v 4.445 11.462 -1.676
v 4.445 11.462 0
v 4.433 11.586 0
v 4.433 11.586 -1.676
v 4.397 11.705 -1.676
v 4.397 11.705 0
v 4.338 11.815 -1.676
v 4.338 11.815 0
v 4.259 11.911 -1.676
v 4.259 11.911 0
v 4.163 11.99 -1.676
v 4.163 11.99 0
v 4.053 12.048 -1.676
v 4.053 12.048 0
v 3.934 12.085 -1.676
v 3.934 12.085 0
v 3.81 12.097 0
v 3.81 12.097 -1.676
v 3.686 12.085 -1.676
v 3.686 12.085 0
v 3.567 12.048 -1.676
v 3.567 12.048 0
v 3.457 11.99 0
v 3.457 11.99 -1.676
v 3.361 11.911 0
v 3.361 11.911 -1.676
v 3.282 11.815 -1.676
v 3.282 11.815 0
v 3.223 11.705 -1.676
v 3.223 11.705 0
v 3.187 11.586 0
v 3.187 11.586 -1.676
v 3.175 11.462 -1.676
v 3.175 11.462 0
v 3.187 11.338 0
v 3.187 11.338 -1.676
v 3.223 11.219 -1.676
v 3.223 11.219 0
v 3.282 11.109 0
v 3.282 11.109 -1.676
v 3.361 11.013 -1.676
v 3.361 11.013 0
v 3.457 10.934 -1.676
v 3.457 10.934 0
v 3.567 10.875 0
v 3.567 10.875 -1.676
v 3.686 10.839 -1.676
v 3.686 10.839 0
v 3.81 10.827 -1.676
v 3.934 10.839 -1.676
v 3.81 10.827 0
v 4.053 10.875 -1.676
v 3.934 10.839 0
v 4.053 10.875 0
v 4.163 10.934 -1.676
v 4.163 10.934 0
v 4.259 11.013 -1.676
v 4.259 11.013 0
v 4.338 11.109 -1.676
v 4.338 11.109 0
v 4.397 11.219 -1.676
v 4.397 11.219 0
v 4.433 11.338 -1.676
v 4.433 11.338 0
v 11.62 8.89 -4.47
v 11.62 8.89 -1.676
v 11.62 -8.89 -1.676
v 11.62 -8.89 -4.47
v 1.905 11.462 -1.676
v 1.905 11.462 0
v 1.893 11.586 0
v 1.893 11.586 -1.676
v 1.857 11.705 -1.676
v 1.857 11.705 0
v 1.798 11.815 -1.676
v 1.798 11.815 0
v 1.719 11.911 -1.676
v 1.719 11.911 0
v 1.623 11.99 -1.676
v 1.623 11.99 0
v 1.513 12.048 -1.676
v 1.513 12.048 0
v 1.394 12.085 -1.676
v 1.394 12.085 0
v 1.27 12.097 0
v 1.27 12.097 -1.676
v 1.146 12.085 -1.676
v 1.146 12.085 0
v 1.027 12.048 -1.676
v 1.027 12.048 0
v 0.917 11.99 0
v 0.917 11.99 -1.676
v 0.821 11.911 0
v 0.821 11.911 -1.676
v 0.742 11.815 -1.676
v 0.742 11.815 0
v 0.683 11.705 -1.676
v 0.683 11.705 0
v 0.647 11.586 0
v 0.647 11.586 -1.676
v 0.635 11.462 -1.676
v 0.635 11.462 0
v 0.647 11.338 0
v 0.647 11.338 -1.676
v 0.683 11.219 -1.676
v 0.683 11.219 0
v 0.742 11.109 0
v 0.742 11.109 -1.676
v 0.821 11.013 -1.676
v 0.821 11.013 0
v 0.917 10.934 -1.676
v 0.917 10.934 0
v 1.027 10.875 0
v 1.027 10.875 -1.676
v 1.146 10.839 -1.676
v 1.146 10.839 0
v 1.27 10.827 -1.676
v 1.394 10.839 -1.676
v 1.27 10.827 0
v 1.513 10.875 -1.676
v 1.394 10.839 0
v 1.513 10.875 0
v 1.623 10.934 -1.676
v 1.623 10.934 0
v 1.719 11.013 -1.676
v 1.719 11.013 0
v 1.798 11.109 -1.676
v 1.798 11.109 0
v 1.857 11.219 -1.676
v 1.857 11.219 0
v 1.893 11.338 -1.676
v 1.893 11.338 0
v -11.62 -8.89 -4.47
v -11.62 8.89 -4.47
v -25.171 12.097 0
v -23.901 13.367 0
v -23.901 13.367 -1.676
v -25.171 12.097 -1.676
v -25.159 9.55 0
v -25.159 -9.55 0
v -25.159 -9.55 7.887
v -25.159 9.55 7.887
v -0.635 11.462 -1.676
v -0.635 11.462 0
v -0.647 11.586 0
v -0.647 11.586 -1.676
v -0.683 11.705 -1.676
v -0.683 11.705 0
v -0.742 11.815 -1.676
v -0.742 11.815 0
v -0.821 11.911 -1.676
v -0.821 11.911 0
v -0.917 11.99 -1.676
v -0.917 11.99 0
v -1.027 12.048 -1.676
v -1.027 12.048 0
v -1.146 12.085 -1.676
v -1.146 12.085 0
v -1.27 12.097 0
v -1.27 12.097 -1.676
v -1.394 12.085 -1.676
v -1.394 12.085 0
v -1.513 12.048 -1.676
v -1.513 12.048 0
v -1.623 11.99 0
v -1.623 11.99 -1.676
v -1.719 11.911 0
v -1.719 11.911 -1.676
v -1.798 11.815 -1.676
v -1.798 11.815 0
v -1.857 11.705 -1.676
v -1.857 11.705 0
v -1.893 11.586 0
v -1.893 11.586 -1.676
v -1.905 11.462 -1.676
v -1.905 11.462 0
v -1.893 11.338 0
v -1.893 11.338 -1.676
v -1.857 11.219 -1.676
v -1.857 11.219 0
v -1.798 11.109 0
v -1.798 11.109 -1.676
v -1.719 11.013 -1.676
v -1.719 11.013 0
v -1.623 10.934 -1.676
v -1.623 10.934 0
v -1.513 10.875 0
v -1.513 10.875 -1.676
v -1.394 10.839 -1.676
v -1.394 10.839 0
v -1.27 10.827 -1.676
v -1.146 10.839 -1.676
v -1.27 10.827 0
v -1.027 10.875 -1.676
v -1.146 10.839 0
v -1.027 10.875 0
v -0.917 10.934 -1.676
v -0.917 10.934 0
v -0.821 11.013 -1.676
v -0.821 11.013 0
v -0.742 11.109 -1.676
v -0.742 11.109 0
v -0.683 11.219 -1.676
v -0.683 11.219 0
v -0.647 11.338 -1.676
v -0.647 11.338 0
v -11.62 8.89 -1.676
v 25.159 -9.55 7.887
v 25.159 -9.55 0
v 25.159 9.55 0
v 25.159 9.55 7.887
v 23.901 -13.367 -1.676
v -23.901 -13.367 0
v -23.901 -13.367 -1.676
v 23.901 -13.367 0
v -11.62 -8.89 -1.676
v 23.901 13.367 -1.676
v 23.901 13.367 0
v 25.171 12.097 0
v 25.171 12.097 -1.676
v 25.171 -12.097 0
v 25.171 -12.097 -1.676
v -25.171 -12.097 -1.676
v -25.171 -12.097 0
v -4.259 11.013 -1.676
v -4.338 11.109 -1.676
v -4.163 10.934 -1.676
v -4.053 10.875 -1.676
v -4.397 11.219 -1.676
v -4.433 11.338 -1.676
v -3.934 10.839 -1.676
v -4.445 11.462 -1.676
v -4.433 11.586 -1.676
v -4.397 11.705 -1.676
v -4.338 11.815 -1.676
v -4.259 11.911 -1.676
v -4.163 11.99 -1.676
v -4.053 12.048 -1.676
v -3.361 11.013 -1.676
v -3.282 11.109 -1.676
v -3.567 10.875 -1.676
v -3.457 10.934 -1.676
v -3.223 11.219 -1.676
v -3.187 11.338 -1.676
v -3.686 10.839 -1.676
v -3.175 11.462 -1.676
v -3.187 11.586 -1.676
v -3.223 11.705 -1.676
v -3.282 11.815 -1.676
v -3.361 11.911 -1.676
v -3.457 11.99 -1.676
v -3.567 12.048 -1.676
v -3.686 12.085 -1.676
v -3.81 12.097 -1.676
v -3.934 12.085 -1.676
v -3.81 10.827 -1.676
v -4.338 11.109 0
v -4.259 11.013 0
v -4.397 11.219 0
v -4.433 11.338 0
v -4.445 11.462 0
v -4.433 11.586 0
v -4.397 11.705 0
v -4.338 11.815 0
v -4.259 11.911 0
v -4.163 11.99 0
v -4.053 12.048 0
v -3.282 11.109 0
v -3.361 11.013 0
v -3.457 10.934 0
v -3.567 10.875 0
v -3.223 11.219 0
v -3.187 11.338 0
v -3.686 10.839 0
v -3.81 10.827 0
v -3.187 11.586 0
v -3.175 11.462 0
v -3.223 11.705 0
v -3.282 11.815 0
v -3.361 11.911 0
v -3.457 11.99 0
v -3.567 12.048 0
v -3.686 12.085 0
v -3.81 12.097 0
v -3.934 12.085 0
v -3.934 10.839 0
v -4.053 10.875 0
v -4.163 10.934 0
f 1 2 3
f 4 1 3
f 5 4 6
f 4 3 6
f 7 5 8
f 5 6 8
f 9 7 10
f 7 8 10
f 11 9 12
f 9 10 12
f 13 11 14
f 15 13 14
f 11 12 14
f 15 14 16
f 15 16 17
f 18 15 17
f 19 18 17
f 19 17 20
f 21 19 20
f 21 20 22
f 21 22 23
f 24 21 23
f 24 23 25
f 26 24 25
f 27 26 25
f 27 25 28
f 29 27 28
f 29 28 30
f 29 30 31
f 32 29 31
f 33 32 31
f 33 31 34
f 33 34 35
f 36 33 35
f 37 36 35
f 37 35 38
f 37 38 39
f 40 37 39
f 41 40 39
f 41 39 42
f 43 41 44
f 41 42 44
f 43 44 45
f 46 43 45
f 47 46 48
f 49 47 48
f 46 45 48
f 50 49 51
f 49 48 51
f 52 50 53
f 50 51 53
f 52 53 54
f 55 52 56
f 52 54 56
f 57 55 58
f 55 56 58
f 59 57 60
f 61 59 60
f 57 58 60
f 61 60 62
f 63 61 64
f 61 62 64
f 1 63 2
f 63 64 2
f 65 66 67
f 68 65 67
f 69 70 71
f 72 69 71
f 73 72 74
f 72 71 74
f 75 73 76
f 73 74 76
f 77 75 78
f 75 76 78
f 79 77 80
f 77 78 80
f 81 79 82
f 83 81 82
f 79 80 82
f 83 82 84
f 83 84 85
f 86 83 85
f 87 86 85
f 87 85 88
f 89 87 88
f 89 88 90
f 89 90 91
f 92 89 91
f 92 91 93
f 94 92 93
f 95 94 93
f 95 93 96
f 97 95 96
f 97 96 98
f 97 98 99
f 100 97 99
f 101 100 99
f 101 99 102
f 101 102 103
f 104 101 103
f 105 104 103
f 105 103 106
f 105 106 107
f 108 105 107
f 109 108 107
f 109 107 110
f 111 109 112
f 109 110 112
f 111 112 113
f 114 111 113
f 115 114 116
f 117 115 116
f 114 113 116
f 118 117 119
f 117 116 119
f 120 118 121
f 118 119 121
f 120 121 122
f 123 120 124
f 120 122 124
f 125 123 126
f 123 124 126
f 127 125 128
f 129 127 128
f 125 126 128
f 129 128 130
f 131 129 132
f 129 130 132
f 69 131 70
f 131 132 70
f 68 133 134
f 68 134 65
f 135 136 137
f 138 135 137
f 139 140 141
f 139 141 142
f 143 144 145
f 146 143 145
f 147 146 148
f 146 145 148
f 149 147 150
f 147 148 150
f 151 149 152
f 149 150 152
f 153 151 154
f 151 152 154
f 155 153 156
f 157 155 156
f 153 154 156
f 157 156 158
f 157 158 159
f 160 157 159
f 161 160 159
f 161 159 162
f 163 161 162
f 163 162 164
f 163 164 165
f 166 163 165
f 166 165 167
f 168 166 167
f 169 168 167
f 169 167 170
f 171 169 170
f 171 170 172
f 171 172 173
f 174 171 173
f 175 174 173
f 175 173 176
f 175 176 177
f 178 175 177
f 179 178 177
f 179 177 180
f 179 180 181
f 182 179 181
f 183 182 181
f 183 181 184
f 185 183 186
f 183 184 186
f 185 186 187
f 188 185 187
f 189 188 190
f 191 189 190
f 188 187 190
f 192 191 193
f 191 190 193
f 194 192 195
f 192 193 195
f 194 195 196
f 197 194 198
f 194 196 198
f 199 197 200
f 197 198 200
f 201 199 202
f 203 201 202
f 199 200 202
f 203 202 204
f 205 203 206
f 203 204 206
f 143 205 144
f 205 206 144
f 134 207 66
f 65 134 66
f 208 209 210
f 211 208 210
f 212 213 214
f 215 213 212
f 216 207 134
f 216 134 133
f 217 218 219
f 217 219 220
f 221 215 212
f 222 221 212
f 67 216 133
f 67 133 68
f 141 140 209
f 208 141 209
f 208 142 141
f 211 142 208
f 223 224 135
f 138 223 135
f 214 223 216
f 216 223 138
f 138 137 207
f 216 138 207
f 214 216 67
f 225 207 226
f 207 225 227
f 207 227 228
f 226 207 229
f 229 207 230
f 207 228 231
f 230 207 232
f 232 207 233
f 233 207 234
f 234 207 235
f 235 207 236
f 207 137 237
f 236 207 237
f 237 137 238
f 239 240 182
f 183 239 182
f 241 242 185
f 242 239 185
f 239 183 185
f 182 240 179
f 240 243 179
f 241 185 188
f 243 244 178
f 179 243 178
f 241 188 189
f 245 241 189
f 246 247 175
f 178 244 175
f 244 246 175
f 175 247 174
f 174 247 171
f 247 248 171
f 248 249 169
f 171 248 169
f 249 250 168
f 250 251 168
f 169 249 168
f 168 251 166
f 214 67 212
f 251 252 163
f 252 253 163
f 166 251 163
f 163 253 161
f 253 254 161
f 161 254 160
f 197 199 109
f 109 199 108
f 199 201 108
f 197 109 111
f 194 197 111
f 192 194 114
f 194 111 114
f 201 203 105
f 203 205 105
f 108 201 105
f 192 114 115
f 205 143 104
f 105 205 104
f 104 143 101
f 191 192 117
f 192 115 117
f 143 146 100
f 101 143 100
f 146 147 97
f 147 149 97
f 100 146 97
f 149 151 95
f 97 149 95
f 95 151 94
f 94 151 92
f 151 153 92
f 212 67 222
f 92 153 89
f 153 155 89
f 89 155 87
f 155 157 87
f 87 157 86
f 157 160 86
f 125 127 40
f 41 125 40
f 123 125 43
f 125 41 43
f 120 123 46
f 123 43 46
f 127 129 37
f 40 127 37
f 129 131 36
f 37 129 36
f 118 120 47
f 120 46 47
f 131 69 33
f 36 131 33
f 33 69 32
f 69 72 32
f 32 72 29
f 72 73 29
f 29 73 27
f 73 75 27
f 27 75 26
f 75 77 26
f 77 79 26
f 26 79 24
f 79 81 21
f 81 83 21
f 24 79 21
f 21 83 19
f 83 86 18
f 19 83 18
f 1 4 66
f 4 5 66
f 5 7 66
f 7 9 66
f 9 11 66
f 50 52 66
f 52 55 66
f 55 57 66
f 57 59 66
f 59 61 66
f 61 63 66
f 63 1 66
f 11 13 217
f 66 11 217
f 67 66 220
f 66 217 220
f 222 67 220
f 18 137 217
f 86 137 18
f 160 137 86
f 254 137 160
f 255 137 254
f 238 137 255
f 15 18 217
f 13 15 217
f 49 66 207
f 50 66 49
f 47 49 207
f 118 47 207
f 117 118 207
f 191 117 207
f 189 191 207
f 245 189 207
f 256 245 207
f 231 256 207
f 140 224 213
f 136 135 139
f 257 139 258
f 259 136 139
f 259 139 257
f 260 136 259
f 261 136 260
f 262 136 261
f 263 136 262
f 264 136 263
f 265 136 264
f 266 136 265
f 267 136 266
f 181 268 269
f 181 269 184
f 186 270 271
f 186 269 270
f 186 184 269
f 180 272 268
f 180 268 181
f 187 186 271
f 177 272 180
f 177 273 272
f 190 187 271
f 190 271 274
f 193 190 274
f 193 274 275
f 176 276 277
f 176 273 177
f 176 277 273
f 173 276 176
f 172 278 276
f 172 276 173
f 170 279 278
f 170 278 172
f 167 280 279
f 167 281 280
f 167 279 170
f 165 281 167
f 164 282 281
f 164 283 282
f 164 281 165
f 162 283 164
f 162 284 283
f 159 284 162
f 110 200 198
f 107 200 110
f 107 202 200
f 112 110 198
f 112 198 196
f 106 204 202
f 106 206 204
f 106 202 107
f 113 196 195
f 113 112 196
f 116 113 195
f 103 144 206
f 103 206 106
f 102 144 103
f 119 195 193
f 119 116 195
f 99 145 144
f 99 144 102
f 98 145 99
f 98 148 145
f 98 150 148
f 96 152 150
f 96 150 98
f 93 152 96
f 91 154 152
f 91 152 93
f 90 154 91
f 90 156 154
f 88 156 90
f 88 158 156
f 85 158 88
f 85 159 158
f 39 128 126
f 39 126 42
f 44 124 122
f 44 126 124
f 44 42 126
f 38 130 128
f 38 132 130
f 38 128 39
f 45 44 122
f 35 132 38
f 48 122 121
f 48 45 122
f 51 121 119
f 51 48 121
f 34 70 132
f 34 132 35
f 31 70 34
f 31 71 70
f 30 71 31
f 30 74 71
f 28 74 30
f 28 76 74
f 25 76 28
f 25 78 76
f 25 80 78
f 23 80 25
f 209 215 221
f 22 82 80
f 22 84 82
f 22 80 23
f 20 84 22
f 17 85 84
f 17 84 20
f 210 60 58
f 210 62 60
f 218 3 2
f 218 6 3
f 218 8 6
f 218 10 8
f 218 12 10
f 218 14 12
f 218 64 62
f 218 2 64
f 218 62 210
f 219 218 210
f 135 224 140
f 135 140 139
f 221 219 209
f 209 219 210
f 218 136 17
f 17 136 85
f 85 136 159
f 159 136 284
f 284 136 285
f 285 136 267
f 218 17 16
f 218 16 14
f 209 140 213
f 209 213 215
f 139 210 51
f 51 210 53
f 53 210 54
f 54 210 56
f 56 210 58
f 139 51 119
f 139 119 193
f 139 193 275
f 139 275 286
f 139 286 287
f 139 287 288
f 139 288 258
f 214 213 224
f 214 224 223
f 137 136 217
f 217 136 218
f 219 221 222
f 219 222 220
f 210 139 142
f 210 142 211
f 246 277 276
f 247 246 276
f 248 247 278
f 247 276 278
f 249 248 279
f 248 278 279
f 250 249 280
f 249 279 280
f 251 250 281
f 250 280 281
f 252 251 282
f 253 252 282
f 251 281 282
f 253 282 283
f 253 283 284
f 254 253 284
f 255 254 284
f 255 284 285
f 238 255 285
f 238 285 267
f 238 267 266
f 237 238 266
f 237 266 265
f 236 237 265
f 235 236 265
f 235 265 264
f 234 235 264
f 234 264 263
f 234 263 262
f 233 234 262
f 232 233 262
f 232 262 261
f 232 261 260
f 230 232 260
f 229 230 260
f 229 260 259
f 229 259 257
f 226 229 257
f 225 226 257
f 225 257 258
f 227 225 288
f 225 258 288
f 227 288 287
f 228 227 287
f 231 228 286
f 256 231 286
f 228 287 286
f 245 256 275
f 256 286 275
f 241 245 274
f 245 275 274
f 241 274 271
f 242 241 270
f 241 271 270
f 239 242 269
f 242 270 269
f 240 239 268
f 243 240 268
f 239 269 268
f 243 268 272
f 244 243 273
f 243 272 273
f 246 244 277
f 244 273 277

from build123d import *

# Parameters (mm, degrees)
F0_W     = 50.3428
F0_H     = 26.7335
F1_DEPTH = 1.6764
F2_W     = 50.3174
F2_H     = 19.1008
F3_DEPTH = 7.8867
F4_W     = 23.241
F4_H     = 17.78
F5_DEPTH = 2.794
F6_R     = 0.635
F7_DEPTH = 25.4
F8_SIZE  = 1.27


with BuildPart() as f1:
    # F0 (on Top) → F1 (new body)
    with BuildSketch(Plane.XY):
        Rectangle(F0_W, F0_H)
    extrude(amount=-F1_DEPTH)

    # F2 (on Top) → F3 (join)
    with BuildSketch(Plane.XY):
        Rectangle(F2_W, F2_H)
    extrude(amount=F3_DEPTH)

    # F4 (on face) → F5 (join)
    with BuildSketch(Plane(origin=(0, 0, -1.6764), x_dir=(1, 0, 0), z_dir=(0, 0, -1))):
        Rectangle(F4_W, F4_H)
    extrude(amount=F5_DEPTH)

    # F6 (on Top) → F7 (cut)
    with BuildSketch(Plane.XY):
        with Locations((-3.81, 11.46175)):
            Circle(F6_R)
        with Locations((-1.27, 11.46175)):
            Circle(F6_R)
        with Locations((1.27, 11.46175)):
            Circle(F6_R)
        with Locations((3.81, 11.46175)):
            Circle(F6_R)
    extrude(amount=-F7_DEPTH, mode=Mode.SUBTRACT)

    # F8
    f8_edges = [f1.edges().sort_by_distance(p)[0] for p in [
        (25.1714, 13.36675, -0.8382),
        (25.1714, -13.36675, -0.8382),
        (-25.1714, -13.36675, -0.8382),
        (-25.1714, 13.36675, -0.8382),
    ]]
    chamfer(f8_edges, length=F8_SIZE)


solid = f1.part
